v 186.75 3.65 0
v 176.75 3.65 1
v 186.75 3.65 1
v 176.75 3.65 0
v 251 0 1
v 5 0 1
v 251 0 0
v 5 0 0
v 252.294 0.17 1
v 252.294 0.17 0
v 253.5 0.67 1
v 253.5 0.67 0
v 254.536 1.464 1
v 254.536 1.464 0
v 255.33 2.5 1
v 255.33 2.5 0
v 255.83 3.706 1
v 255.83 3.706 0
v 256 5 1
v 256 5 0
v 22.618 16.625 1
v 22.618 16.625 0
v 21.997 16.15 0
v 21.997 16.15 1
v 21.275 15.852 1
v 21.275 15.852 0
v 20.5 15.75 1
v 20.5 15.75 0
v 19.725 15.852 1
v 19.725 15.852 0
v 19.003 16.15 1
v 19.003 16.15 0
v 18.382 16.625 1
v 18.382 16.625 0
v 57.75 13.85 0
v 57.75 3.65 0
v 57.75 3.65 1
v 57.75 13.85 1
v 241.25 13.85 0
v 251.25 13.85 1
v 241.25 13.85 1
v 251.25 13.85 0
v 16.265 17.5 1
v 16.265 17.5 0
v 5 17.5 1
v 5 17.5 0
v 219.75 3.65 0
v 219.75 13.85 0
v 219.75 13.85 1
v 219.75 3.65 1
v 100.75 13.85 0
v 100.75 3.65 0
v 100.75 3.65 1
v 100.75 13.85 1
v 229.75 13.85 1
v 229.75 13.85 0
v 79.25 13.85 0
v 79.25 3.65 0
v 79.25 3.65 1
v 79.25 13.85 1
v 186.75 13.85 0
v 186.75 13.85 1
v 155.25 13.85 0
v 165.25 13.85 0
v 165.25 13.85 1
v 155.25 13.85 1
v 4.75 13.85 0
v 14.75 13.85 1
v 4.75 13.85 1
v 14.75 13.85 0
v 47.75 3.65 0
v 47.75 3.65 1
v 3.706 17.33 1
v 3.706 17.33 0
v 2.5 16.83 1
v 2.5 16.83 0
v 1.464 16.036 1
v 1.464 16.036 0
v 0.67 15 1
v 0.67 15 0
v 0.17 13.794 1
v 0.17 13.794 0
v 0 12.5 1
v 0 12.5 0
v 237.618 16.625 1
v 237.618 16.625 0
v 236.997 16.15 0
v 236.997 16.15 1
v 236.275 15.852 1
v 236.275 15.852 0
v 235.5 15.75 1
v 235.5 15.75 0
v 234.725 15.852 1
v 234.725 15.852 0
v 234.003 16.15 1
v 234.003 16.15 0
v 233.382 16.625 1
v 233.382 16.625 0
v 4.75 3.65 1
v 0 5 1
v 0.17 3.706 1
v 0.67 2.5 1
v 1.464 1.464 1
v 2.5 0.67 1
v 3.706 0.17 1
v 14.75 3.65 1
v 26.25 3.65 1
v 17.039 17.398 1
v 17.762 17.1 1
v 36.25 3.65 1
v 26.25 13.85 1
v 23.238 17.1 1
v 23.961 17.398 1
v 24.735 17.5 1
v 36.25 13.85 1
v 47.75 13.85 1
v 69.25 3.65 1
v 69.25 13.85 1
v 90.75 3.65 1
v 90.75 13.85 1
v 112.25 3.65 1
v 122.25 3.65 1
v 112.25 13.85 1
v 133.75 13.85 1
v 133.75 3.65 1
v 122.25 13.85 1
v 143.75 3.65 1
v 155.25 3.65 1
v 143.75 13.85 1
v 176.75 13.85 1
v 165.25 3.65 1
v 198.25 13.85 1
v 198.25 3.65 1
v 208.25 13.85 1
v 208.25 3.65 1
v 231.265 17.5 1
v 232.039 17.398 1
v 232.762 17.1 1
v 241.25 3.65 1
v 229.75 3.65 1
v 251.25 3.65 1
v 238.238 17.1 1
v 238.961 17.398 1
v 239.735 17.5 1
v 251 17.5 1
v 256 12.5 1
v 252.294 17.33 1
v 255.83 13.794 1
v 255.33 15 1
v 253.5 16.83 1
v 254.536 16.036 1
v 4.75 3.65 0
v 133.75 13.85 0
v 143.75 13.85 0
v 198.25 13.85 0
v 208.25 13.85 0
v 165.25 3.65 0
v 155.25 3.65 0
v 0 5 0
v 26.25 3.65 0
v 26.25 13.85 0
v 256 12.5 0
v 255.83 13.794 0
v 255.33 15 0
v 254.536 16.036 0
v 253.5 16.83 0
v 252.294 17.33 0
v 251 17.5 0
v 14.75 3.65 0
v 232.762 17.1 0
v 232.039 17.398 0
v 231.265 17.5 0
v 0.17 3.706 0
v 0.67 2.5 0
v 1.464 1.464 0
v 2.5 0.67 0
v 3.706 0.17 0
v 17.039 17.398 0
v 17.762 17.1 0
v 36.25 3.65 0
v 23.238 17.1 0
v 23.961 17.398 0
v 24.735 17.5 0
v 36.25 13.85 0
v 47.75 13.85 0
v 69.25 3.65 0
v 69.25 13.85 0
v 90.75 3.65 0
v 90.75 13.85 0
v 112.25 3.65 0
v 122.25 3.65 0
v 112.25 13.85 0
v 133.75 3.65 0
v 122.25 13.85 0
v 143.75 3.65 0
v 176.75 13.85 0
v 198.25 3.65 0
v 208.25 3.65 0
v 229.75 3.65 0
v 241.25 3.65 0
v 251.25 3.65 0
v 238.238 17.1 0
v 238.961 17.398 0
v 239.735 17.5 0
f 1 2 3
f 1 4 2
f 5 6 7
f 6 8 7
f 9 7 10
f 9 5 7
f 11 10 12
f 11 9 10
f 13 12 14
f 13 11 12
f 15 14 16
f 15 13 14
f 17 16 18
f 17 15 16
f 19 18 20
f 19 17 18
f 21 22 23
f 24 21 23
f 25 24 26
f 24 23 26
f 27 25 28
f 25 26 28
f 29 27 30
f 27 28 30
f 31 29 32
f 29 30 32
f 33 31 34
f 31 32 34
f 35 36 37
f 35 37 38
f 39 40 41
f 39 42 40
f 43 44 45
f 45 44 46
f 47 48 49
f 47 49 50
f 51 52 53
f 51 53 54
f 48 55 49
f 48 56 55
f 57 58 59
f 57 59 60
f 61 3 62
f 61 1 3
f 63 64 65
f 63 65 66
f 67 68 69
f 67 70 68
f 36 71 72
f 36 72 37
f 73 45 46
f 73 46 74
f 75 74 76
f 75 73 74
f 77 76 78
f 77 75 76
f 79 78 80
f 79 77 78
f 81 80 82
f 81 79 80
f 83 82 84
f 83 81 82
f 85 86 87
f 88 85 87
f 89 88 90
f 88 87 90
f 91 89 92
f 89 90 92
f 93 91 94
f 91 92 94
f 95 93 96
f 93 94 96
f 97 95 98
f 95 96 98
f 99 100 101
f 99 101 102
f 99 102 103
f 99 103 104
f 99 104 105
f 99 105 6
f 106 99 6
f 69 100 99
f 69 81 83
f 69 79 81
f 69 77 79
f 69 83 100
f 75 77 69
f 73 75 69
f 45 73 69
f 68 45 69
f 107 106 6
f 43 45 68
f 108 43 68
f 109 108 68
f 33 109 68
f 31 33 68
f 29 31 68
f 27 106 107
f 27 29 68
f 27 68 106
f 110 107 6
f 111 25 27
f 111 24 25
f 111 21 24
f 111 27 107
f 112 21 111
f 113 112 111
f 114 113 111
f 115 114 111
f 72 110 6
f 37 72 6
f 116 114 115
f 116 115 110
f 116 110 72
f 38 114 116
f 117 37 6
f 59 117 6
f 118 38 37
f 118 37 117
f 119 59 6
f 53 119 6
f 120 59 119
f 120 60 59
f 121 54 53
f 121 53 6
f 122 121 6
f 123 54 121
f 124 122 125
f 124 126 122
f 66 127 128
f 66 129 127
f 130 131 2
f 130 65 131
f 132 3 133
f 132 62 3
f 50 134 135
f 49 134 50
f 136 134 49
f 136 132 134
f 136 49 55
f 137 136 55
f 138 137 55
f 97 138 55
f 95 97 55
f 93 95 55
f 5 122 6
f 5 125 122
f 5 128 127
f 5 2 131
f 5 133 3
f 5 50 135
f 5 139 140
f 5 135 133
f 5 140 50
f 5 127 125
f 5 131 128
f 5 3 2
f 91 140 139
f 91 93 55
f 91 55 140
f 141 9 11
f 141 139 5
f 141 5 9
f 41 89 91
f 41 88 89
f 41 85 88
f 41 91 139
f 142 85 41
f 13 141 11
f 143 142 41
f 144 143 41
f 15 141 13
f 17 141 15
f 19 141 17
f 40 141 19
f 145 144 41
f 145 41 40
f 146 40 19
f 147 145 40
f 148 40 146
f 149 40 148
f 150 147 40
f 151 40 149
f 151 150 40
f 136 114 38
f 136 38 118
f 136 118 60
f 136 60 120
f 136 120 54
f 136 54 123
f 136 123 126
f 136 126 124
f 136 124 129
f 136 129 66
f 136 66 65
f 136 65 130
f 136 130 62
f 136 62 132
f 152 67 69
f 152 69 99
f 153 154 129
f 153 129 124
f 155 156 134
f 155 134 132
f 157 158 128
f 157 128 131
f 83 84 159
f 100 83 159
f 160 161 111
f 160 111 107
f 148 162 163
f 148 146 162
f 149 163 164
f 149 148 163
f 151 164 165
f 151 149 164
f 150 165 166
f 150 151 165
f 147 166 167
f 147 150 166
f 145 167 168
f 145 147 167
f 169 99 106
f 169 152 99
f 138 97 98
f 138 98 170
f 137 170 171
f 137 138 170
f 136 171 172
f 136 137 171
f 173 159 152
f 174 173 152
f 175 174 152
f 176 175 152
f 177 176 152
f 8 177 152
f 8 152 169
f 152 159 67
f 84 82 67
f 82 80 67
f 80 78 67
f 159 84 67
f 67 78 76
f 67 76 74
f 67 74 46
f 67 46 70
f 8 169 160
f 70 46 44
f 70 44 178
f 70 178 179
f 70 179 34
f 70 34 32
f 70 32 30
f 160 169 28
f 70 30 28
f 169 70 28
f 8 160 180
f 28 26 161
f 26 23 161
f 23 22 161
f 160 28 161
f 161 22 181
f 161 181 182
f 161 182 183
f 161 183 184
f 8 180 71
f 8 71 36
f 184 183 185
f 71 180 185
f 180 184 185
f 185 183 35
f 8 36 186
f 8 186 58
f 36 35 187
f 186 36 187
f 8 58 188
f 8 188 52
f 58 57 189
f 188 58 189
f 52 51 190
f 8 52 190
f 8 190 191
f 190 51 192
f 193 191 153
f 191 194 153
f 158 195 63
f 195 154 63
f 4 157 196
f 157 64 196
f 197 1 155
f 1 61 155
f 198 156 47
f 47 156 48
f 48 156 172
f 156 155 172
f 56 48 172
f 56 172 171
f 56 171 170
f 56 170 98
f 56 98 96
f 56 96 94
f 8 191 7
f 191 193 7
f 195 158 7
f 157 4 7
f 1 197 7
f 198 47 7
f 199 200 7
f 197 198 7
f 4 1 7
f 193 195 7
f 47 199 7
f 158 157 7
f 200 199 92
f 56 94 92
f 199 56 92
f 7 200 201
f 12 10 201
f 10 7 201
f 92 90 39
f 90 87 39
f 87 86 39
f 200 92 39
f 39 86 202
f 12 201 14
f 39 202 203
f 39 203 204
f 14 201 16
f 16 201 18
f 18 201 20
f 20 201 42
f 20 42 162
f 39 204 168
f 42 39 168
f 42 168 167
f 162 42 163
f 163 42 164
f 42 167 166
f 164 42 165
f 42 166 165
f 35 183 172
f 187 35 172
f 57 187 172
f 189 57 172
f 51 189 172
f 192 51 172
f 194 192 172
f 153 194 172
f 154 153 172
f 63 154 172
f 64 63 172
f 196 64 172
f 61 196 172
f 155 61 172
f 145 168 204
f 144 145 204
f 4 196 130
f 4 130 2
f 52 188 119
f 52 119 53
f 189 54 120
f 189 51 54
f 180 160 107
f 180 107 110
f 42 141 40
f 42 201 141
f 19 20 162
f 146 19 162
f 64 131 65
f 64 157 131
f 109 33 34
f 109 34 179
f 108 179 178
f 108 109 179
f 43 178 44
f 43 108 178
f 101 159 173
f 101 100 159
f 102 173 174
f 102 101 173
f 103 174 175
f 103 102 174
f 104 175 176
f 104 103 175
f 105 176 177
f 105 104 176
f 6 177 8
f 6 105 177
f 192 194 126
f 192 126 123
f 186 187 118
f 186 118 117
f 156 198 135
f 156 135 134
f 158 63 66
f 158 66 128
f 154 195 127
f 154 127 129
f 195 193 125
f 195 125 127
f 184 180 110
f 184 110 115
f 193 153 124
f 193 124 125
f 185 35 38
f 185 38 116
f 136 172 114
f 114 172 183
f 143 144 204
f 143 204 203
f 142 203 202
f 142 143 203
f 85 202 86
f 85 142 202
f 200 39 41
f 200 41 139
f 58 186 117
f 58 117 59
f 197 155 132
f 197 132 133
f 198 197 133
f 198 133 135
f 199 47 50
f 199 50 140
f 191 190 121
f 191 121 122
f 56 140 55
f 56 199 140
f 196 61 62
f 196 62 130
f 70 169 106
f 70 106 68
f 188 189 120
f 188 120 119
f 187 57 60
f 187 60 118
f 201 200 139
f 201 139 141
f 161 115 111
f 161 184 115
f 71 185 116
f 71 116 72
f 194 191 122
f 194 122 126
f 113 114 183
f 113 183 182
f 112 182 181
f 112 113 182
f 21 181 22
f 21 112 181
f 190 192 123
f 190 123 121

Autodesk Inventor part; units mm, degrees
ref_plane "YZ Plane" through (0, 0, 0) normal (1, 0, 0) x (0, 1, 0)
ref_plane "XZ Plane" through (0, 0, 0) normal (0, 1, 0) x (-1, 0, 0)
ref_plane "XY Plane" through (0, 0, 0) normal (0, 0, 1) x (1, 0, 0)
sketch "Skizze1" plane through (0, 0, 0) normal (0, 0, 1) x (1, 0, 0)
  line L0 (0, 0) -> (256, 0)
  line L1 (256, 0) -> (256, 17.5)
  line L2 (256, 17.5) -> (0, 17.5)
  line L3 (0, 17.5) -> (0, 0)
  line L4 (4.75, 3.65) -> (14.75, 3.65)
  line L5 (14.75, 3.65) -> (14.75, 13.85)
  line L6 (14.75, 13.85) -> (4.75, 13.85)
  line L7 (4.75, 13.85) -> (4.75, 3.65)
  line L8 (36.25, 3.65) -> (36.25, 13.85)
  line L9 (36.25, 13.85) -> (26.25, 13.85)
  line L10 (26.25, 13.85) -> (26.25, 3.65)
  line L11 (26.25, 3.65) -> (36.25, 3.65)
  line L12 (57.75, 3.65) -> (57.75, 13.85)
  line L13 (57.75, 13.85) -> (47.75, 13.85)
  line L14 (47.75, 13.85) -> (47.75, 3.65)
  line L15 (47.75, 3.65) -> (57.75, 3.65)
  line L16 (79.25, 3.65) -> (79.25, 13.85)
  line L17 (79.25, 13.85) -> (69.25, 13.85)
  line L18 (69.25, 13.85) -> (69.25, 3.65)
  line L19 (69.25, 3.65) -> (79.25, 3.65)
  line L20 (100.75, 3.65) -> (100.75, 13.85)
  line L21 (100.75, 13.85) -> (90.75, 13.85)
  line L22 (90.75, 13.85) -> (90.75, 3.65)
  line L23 (90.75, 3.65) -> (100.75, 3.65)
  line L24 (122.25, 3.65) -> (122.25, 13.85)
  line L25 (122.25, 13.85) -> (112.25, 13.85)
  line L26 (112.25, 13.85) -> (112.25, 3.65)
  line L27 (112.25, 3.65) -> (122.25, 3.65)
  line L28 (143.75, 3.65) -> (143.75, 13.85)
  line L29 (143.75, 13.85) -> (133.75, 13.85)
  line L30 (133.75, 13.85) -> (133.75, 3.65)
  line L31 (133.75, 3.65) -> (143.75, 3.65)
  line L32 (165.25, 3.65) -> (165.25, 13.85)
  line L33 (165.25, 13.85) -> (155.25, 13.85)
  line L34 (155.25, 13.85) -> (155.25, 3.65)
  line L35 (155.25, 3.65) -> (165.25, 3.65)
  line L36 (186.75, 3.65) -> (186.75, 13.85)
  line L37 (186.75, 13.85) -> (176.75, 13.85)
  line L38 (176.75, 13.85) -> (176.75, 3.65)
  line L39 (176.75, 3.65) -> (186.75, 3.65)
  line L40 (208.25, 3.65) -> (208.25, 13.85)
  line L41 (208.25, 13.85) -> (198.25, 13.85)
  line L42 (198.25, 13.85) -> (198.25, 3.65)
  line L43 (198.25, 3.65) -> (208.25, 3.65)
  line L44 (229.75, 3.65) -> (229.75, 13.85)
  line L45 (229.75, 13.85) -> (219.75, 13.85)
  line L46 (219.75, 13.85) -> (219.75, 3.65)
  line L47 (219.75, 3.65) -> (229.75, 3.65)
  line L48 (251.25, 3.65) -> (251.25, 13.85)
  line L49 (251.25, 13.85) -> (241.25, 13.85)
  line L50 (241.25, 13.85) -> (241.25, 3.65)
  line L51 (241.25, 3.65) -> (251.25, 3.65)
  arc A0 (232.7728, 17.5) -> (238.2272, 17.5) centre (235.5, 18.75) ccw
  arc A1 (17.7728, 17.5) -> (23.2272, 17.5) centre (20.5, 18.75) ccw
  point P0 (0, 8.75)
  point P1 (128, 17.5)
  point P2 (106.5, 8.75)
  point P3 (149.5, 8.75)
  point P4 (256, 8.75)
  point P5 (4.75, 8.75)
  point P6 (117.25, 3.65)
  point P7 (31.25, 3.65)
  point P8 (224.75, 3.65)
  point P9 (31.25, 13.85)
  point P10 (224.75, 13.85)
  dimension "d0" = 256
  dimension "d1" = 17.5
  dimension "d2" = 10.2
  dimension "d3" = 10
  dimension "d19" = 21.5
  dimension "d24" = 43
  dimension "d25" = 21.5
  dimension "d26" = 10.75
  dimension "d33" = 1.25
  dimension "d34" = 10.75
  dimension "d35" = 10.75
  dimension "d36" = 3
extrude "Extrusion1" add sketch "Skizze1" along normal blind 1 contours L3 L2 A1 A0 L1 L0
fillet "Rundung1" radius 5 4 edges at (256, 17.5, 0.5) (256, 0, 0.5) (0, 17.5, 0.5) (0, 0, 0.5)
fillet "Rundung2" radius 3 4 edges at (17.7728, 17.5, 0.5) (23.2272, 17.5, 0.5) (238.2272, 17.5, 0.5) (232.7728, 17.5, 0.5)
sketch "Skizze2" plane through (0, 0, 1) normal (0, 0, 1) x (1, 0, 0)
  arc A0 (0, 5) -> (5, 0) centre (5, 5) ccw projected
  line L0 (5, 0) -> (251, 0) projected
  arc A1 (251, 0) -> (256, 5) centre (251, 5) ccw projected
  line L1 (256, 5) -> (256, 12.5) projected
  arc A2 (256, 12.5) -> (251, 17.5) centre (251, 12.5) ccw projected
  line L2 (251, 17.5) -> (239.7353, 17.5) projected
  arc A3 (5, 17.5) -> (0, 12.5) centre (5, 12.5) ccw projected
  line L3 (0, 12.5) -> (0, 5) projected
  line L4 (251.25, 3.65) -> (241.25, 3.65) projected
  line L5 (241.25, 3.65) -> (241.25, 13.85) projected
  line L6 (241.25, 13.85) -> (251.25, 13.85) projected
  line L7 (251.25, 13.85) -> (251.25, 3.65) projected
  line L8 (229.75, 3.65) -> (219.75, 3.65) projected
  line L9 (219.75, 3.65) -> (219.75, 13.85) projected
  line L10 (219.75, 13.85) -> (229.75, 13.85) projected
  line L11 (229.75, 13.85) -> (229.75, 3.65) projected
  line L12 (208.25, 3.65) -> (198.25, 3.65) projected
  line L13 (198.25, 3.65) -> (198.25, 13.85) projected
  line L14 (198.25, 13.85) -> (208.25, 13.85) projected
  line L15 (208.25, 13.85) -> (208.25, 3.65) projected
  line L16 (186.75, 3.65) -> (176.75, 3.65) projected
  line L17 (176.75, 3.65) -> (176.75, 13.85) projected
  line L18 (176.75, 13.85) -> (186.75, 13.85) projected
  line L19 (186.75, 13.85) -> (186.75, 3.65) projected
  line L20 (165.25, 3.65) -> (155.25, 3.65) projected
  line L21 (155.25, 3.65) -> (155.25, 13.85) projected
  line L22 (155.25, 13.85) -> (165.25, 13.85) projected
  line L23 (165.25, 13.85) -> (165.25, 3.65) projected
  line L24 (143.75, 3.65) -> (133.75, 3.65) projected
  line L25 (133.75, 3.65) -> (133.75, 13.85) projected
  line L26 (133.75, 13.85) -> (143.75, 13.85) projected
  line L27 (143.75, 13.85) -> (143.75, 3.65) projected
  line L28 (122.25, 3.65) -> (112.25, 3.65) projected
  line L29 (112.25, 3.65) -> (112.25, 13.85) projected
  line L30 (112.25, 13.85) -> (122.25, 13.85) projected
  line L31 (122.25, 13.85) -> (122.25, 3.65) projected
  line L32 (100.75, 3.65) -> (90.75, 3.65) projected
  line L33 (90.75, 3.65) -> (90.75, 13.85) projected
  line L34 (90.75, 13.85) -> (100.75, 13.85) projected
  line L35 (100.75, 13.85) -> (100.75, 3.65) projected
  line L36 (79.25, 3.65) -> (69.25, 3.65) projected
  line L37 (69.25, 3.65) -> (69.25, 13.85) projected
  line L38 (69.25, 13.85) -> (79.25, 13.85) projected
  line L39 (79.25, 13.85) -> (79.25, 3.65) projected
  line L40 (57.75, 3.65) -> (47.75, 3.65) projected
  line L41 (47.75, 3.65) -> (47.75, 13.85) projected
  line L42 (47.75, 13.85) -> (57.75, 13.85) projected
  line L43 (57.75, 13.85) -> (57.75, 3.65) projected
  line L44 (36.25, 3.65) -> (26.25, 3.65) projected
  line L45 (26.25, 3.65) -> (26.25, 13.85) projected
  line L46 (26.25, 13.85) -> (36.25, 13.85) projected
  line L47 (36.25, 13.85) -> (36.25, 3.65) projected
  line L48 (4.75, 3.65) -> (4.75, 13.85) projected
  line L49 (4.75, 13.85) -> (14.75, 13.85) projected
  line L50 (14.75, 13.85) -> (14.75, 3.65) projected
  line L51 (14.75, 3.65) -> (4.75, 3.65) projected
  arc A4 (233.3824, 16.625) -> (237.6176, 16.625) centre (235.5, 18.75) ccw projected
  line L52 (231.2647, 17.5) -> (24.7353, 17.5) projected
  arc A5 (18.3824, 16.625) -> (22.6176, 16.625) centre (20.5, 18.75) ccw projected
  line L53 (16.2647, 17.5) -> (5, 17.5) projected
  arc A6 (233.3824, 16.625) -> (231.2647, 17.5) centre (231.2647, 14.5) ccw projected
  arc A7 (24.7353, 17.5) -> (22.6176, 16.625) centre (24.7353, 14.5) ccw projected
  arc A8 (18.3824, 16.625) -> (16.2647, 17.5) centre (16.2647, 14.5) ccw projected
  arc A9 (239.7353, 17.5) -> (237.6176, 16.625) centre (239.7353, 14.5) ccw projected
  point P0 (0, 0)
equation "\"d24\" = 2 * d19"
equation "\"d25\" = 0.5 * d24"
equation "\"d34\" = 0.5 * d19"
equation "\"d35\" = d34"
equation "\"Biegeradius\" = Stärke"
equation "\"BreiteBiegungsfreistellung\" = Stärke"
equation "\"TiefeBiegungsfreistellung\" = 0.5 * Stärke"
equation "\"GrößeEckenfreistellung\" = 4 * Stärke"
equation "\"MinimalRest\" = 2 * Stärke"
equation "\"Übergangsradius\" = Biegeradius"
equation "\"JacobiRadiusGröße\" = Biegeradius"
equation "\"Abstandsgröße\" = Stärke"
equation "\"Stärke\" = 0.5"
properties part number "bat_contacts_v2_plate_long" material "Kupfer"
